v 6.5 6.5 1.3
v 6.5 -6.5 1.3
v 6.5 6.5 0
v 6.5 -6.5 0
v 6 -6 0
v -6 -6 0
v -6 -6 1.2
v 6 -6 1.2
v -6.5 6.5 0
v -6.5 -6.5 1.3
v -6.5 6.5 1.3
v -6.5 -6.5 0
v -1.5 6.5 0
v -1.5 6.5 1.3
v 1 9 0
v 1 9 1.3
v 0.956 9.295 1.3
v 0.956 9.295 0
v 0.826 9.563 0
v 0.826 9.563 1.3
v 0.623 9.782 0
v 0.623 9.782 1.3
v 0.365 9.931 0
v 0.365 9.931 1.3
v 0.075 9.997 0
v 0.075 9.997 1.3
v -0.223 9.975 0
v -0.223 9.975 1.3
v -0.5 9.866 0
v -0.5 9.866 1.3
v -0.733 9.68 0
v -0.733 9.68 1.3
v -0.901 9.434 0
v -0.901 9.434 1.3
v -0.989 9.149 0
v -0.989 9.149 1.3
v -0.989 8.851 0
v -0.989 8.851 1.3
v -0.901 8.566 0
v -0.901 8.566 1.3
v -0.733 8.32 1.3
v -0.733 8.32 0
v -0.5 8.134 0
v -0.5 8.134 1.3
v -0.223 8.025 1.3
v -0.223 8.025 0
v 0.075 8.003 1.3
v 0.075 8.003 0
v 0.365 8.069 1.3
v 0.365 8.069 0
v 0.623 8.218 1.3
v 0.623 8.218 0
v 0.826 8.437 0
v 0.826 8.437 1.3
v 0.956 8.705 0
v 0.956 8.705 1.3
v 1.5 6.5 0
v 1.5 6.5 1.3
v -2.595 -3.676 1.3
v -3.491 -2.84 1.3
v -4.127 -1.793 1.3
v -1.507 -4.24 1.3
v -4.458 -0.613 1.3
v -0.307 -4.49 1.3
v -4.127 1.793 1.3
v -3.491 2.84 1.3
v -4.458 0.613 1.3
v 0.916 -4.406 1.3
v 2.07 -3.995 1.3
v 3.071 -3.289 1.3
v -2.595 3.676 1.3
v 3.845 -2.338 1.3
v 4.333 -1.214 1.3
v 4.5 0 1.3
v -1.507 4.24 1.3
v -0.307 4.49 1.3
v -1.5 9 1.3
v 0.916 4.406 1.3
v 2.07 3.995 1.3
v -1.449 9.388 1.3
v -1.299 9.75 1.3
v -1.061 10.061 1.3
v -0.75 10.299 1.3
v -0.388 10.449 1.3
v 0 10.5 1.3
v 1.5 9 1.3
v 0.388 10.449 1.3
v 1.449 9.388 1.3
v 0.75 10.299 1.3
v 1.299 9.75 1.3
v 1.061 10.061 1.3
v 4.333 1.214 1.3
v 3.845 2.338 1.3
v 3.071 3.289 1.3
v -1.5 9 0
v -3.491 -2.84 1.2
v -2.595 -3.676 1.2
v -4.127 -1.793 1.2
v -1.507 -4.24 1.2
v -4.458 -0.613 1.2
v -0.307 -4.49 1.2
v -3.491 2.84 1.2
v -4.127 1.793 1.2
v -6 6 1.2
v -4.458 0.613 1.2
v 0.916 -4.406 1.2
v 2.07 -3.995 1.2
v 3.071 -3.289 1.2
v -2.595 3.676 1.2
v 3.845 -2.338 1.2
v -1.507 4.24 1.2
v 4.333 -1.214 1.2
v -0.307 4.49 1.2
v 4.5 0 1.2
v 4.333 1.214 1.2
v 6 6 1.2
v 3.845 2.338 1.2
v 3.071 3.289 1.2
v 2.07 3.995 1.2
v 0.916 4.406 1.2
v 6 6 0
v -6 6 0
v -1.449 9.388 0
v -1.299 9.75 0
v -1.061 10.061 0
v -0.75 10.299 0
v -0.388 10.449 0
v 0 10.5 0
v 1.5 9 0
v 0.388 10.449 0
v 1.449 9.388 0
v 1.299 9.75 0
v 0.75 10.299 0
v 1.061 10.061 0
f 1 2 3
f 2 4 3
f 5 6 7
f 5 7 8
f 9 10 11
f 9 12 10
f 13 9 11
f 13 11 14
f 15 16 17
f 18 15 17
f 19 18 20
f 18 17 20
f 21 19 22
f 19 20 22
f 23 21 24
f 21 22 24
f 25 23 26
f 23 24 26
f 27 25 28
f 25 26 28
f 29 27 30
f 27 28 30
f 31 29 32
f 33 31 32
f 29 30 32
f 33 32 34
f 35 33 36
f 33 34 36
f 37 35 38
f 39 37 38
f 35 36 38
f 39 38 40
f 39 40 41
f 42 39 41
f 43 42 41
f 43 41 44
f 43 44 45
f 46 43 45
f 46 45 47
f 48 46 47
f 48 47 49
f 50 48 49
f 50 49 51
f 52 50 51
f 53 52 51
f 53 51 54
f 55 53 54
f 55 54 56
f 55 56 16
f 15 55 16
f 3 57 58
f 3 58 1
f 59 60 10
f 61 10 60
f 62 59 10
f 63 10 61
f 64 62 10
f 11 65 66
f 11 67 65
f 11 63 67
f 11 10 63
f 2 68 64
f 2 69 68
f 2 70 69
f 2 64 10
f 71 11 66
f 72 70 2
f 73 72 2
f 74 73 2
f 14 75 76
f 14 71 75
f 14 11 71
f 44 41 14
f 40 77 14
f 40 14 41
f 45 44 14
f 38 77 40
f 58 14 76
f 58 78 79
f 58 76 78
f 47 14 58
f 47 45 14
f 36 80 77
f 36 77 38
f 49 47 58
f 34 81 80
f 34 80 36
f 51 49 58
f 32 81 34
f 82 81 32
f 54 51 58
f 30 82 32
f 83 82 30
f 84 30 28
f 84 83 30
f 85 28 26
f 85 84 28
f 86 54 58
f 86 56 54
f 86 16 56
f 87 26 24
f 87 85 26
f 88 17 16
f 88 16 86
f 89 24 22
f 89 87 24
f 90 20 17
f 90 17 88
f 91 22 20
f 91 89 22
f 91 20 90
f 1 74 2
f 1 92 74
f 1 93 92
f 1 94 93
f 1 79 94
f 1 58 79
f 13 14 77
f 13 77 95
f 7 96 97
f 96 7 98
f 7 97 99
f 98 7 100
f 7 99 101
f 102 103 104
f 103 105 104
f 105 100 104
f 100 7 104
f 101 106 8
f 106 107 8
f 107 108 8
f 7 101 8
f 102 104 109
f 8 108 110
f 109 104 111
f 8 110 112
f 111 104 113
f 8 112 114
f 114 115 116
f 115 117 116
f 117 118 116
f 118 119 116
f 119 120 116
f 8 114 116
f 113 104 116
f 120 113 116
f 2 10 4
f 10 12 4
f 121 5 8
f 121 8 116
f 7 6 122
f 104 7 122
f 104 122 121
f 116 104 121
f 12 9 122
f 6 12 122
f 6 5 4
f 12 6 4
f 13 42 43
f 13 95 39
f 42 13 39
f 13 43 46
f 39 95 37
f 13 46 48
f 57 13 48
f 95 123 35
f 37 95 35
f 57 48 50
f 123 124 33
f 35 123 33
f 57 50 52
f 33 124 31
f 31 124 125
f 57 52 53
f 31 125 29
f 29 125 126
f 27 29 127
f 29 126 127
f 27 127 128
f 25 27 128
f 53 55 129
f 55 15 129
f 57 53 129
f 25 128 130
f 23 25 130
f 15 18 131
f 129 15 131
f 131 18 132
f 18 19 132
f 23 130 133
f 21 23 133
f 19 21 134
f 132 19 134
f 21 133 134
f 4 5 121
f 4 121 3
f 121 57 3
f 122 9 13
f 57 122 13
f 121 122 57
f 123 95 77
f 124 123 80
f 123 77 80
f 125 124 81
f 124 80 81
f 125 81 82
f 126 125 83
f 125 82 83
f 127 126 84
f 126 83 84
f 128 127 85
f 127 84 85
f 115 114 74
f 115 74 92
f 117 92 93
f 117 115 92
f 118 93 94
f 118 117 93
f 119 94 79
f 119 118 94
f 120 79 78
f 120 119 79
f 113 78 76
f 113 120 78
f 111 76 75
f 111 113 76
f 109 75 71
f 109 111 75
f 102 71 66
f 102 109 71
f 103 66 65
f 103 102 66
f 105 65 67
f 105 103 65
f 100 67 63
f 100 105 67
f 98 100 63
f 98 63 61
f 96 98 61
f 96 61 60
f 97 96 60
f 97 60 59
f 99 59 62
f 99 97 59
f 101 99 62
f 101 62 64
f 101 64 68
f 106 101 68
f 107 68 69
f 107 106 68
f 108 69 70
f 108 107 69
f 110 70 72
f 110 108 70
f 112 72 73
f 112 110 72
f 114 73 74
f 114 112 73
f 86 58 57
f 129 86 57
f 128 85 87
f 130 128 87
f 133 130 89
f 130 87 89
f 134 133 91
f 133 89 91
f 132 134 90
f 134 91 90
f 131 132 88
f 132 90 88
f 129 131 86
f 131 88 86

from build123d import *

# Parameters (mm, degrees)
SKETCH_1_W          = 13
SKETCH_1_H          = 13
SKETCH_1_W_2        = 12
SKETCH_1_H_2        = 12
EXTRUDE_1_DEPTH     = 1.2
SKETCH_2_W          = 13
SKETCH_2_H          = 13
SKETCH_2_R          = 4.5
EXTRUDE_2_DEPTH     = 0.1
SKETCH_3_W          = 3
SKETCH_3_H          = 1.3
EXTRUDE_3_DEPTH     = 4
CUT_EXTRUDE_1_DEPTH = 4
SKETCH_5_R          = 1
CUT_EXTRUDE_2_DEPTH = 4


with BuildPart() as part:
    # 草图1 → 凸台-拉伸1 (new body)
    with BuildSketch(Plane.XY):
        Rectangle(SKETCH_1_W, SKETCH_1_H)
        Rectangle(SKETCH_1_W_2, SKETCH_1_H_2, mode=Mode.SUBTRACT)
    extrude(amount=EXTRUDE_1_DEPTH)

    # 草图2 → 凸台-拉伸2 (add)
    with BuildSketch(Plane.XY.offset(1.2)):
        Rectangle(SKETCH_2_W, SKETCH_2_H)
        Circle(SKETCH_2_R, mode=Mode.SUBTRACT)
    extrude(amount=EXTRUDE_2_DEPTH)

    # 草图3 → 凸台-拉伸3 (add)
    with BuildSketch(Plane(origin=(0, 6.5, 0), x_dir=(1, 0, 0), z_dir=(0, 1, 0))):
        with Locations((0, -0.65)):
            Rectangle(SKETCH_3_W, SKETCH_3_H)
    extrude(amount=EXTRUDE_3_DEPTH)

    # 草图4 → 切除-拉伸1 (cut)
    with BuildSketch(Plane.XY.offset(1.3)):
        with BuildLine():
            Line((-1.5, 10.5), (-1.5, 9))
            ThreePointArc((-1.5, 9), (-1.060660172, 10.060660172), (0, 10.5))
            Line((0, 10.5), (-1.5, 10.5))
        make_face()
        with BuildLine():
            ThreePointArc((0, 10.5), (1.060660172, 10.060660172), (1.5, 9))
            Line((1.5, 9), (1.5, 10.5))
            Line((1.5, 10.5), (0, 10.5))
        make_face()
    extrude(amount=-CUT_EXTRUDE_1_DEPTH, mode=Mode.SUBTRACT)

    # 草图5 → 切除-拉伸2 (cut)
    with BuildSketch(Plane.XY.offset(1.3)):
        with Locations((0, 9)):
            Circle(SKETCH_5_R)
    extrude(amount=-CUT_EXTRUDE_2_DEPTH, mode=Mode.SUBTRACT)


solid = part.part
